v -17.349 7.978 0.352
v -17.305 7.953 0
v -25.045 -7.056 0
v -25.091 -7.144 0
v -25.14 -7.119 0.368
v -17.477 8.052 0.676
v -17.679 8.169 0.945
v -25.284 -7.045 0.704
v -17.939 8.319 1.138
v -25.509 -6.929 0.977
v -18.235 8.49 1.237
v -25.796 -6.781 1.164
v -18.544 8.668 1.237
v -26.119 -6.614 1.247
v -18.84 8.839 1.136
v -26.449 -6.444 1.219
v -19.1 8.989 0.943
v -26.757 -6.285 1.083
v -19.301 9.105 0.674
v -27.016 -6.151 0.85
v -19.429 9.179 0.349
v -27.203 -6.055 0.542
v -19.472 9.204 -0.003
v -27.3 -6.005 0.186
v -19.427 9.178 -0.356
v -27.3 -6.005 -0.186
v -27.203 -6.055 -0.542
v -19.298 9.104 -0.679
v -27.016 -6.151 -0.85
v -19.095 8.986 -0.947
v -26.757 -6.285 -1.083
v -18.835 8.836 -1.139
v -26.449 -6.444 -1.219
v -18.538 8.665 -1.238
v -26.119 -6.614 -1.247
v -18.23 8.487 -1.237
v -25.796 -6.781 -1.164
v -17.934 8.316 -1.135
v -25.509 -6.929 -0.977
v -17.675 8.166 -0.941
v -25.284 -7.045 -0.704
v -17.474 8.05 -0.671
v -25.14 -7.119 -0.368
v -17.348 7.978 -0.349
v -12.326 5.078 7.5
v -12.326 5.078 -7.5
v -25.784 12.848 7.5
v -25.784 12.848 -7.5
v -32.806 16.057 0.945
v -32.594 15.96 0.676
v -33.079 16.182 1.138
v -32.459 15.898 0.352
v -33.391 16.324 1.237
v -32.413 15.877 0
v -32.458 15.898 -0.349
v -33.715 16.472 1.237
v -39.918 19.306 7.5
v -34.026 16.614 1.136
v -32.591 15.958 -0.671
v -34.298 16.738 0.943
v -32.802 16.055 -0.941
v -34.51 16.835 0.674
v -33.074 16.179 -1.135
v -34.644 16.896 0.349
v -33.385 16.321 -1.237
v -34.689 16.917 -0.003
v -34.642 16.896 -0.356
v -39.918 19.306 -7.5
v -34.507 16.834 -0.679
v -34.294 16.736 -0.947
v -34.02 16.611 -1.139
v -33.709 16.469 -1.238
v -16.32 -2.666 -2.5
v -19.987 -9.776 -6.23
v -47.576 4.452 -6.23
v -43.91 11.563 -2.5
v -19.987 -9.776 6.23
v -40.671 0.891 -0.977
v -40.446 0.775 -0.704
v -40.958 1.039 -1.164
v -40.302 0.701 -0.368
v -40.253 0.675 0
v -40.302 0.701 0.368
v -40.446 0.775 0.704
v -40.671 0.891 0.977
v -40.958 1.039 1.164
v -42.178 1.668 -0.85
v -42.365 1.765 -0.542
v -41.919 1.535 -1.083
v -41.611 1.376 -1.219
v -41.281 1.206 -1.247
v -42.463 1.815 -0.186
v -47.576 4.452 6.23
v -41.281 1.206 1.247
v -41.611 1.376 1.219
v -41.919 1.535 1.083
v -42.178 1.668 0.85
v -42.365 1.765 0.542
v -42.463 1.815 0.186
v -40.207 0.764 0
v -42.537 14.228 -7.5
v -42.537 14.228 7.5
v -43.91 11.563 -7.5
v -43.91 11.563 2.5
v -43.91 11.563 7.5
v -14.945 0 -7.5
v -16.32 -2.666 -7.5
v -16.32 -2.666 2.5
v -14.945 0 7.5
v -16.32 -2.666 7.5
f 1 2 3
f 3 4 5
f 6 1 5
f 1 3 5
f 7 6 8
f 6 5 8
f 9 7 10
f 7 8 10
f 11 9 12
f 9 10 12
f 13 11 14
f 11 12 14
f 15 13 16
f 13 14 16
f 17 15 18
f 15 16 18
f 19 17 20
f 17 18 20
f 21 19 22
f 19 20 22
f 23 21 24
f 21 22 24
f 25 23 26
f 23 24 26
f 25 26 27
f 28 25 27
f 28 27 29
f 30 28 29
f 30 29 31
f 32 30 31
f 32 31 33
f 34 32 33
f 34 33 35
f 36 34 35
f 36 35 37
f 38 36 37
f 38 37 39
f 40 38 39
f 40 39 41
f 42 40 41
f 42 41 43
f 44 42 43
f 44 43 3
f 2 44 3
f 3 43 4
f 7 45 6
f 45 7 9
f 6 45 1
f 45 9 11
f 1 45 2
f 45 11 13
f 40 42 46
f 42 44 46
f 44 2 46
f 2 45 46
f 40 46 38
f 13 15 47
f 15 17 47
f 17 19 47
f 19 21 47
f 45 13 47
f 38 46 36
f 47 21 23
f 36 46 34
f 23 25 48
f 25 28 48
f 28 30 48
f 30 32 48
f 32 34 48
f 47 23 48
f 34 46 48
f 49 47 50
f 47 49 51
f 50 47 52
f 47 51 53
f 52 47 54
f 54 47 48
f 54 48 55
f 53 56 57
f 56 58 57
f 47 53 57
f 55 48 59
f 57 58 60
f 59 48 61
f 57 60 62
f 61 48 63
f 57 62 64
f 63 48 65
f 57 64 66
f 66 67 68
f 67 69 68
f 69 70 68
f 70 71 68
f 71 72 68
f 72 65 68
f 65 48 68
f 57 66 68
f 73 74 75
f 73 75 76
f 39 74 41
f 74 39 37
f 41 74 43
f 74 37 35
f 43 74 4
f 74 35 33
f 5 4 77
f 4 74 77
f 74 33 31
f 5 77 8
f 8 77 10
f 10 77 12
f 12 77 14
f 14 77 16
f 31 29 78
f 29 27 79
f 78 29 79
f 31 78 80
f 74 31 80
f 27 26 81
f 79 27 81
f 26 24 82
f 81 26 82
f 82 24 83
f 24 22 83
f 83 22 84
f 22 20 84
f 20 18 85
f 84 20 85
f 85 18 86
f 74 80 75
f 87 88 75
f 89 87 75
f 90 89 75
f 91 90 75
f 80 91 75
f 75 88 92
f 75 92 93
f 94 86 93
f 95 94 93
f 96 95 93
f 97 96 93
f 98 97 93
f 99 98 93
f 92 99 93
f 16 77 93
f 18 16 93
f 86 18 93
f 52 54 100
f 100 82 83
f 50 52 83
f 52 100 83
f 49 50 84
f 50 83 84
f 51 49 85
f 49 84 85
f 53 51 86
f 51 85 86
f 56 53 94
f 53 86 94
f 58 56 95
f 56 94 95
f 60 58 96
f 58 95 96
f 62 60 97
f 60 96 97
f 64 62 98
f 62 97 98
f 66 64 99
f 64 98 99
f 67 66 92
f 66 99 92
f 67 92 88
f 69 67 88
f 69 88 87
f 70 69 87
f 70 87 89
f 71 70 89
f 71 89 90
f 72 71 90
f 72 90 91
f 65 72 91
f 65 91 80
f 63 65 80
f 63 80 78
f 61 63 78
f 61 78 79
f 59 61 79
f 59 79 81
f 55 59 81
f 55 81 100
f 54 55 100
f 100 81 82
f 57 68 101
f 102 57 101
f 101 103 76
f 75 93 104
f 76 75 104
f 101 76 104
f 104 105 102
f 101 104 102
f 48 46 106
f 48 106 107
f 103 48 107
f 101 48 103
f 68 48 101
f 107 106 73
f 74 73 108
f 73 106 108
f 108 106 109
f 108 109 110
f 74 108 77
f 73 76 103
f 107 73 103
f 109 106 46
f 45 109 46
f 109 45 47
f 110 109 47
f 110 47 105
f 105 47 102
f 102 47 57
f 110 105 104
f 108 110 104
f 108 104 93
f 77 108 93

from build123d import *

# Parameters (mm, degrees)
STOCK_SPIRALE_ENROUL_E_1_START = -7.5
STOCK_SPIRALE_ENROUL_E_1_DEPTH = 15
BOSS_EXTRU_1_DEPTH             = 15
ENL_V_MAT_EXTRU_1_REACH        = 41.844
ESQUISSE40_R                   = 1.25
ENL_V_MAT_EXTRU_39_DEPTH       = 0.1
ESQUISSE45_R                   = 1.25
ENL_V_MAT_EXTRU_44_DEPTH       = 54.34000069


# Read off the part's stored shape, not the designer's step: Stock-spirale_enroulée-1
with BuildPart() as part:
    # Stock-spirale_enroulée-1 outline → Stock-spirale_enroulée-1 (new body)
    with BuildSketch(Plane.XY.offset(STOCK_SPIRALE_ENROUL_E_1_START)):
        Polygon((-32.409116649, 0), (-14.945224597, 0), (-12.326158681, 5.078291377), (-25.783924084, 12.848135855), (-39.918116919, 19.306194835), (-42.53651187, 14.227557472), align=None)
    extrude(amount=STOCK_SPIRALE_ENROUL_E_1_DEPTH)

    # Esquisse1 → Boss.-Extru.1 (add)
    with BuildSketch(Plane.XY.offset(7.5)):
        Polygon((-42.53651187, 14.227557472), (-32.409116649, 0), (-14.945224597, 0), (-19.987274825, -9.776386321), (-47.576330697, 4.452327735), align=None)
    extrude(amount=-BOSS_EXTRU_1_DEPTH)

    # Enlèv. mat.-Extru.1: up to this plane
    enl_v_mat_extru_1_end = Plane(origin=(-39.918116919, 19.306194835, 7.5), z_dir=(0.8888229444852807, -0.45825077562020095, 0))
    # Esquisse2 → Enlèv. mat.-Extru.1 (cut, up to the surface)
    with BuildSketch(Plane(origin=(-11.805211849, 6.088391881, 0), x_dir=(0, 0, -1), z_dir=(0.8887623928011207, -0.4583682025865522, 0)), mode=Mode.PRIVATE) as enl_v_mat_extru_1_sk1:
        Polygon((-7.5, -9.850415736), (-2.5, -9.850415736), (-6.230461265, -17.850415736), (-7.5, -17.850415736), align=None)
    enl_v_mat_extru_1_tool1 = split(extrude(enl_v_mat_extru_1_sk1.sketch, amount=-ENL_V_MAT_EXTRU_1_REACH, mode=Mode.PRIVATE), bisect_by=enl_v_mat_extru_1_end, keep=Keep.BOTH, mode=Mode.PRIVATE)
    add(enl_v_mat_extru_1_tool1.solids().sort_by_distance((-17.790155, -5.516236, 5.747642))[0], mode=Mode.SUBTRACT)
    # Esquisse2 → Enlèv. mat.-Extru.1 (cut, up to the surface)
    with BuildSketch(Plane(origin=(-11.805211849, 6.088391881, 0), x_dir=(0, 0, -1), z_dir=(0.8887623928011207, -0.4583682025865522, 0)), mode=Mode.PRIVATE) as enl_v_mat_extru_1_sk2:
        Polygon((6.230461265, -17.850415736), (2.5, -9.850415736), (7.5, -9.850415736), (7.5, -17.850415736), align=None)
    enl_v_mat_extru_1_tool2 = split(extrude(enl_v_mat_extru_1_sk2.sketch, amount=-ENL_V_MAT_EXTRU_1_REACH, mode=Mode.PRIVATE), bisect_by=enl_v_mat_extru_1_end, keep=Keep.BOTH, mode=Mode.PRIVATE)
    add(enl_v_mat_extru_1_tool2.solids().sort_by_distance((-17.790155, -5.516236, -5.747642))[0], mode=Mode.SUBTRACT)

    # Esquisse40 → Enlèv. mat.-Extru.39 (cut)
    with BuildSketch(Plane(origin=(-35.583416905, -1.7328691, -7.5), x_dir=(0.8887623928011112, -0.4583682025865705, 0), z_dir=(-0.4583682025865705, -0.8887623928011112, 0))):
        with Locations((-6.504075816, 7.5)):
            Circle(ESQUISSE40_R)
        with Locations((10.556032704, 7.5)):
            Circle(ESQUISSE40_R)
    extrude(amount=-ENL_V_MAT_EXTRU_39_DEPTH, mode=Mode.SUBTRACT)

    # Esquisse45 → Enlèv. mat.-Extru.44 (cut, through all)
    with BuildSketch(Plane(origin=(-8.182062976, -15.864778202, 0), x_dir=(0.8887623928011112, -0.4583682025865705, 0), z_dir=(-0.4583682025865705, -0.8887623928011112, 0))):
        with Locations((-37.334986474, 0)):
            Circle(ESQUISSE45_R)
        with Locations((-20.274877954, 0)):
            Circle(ESQUISSE45_R)
    extrude(amount=-ENL_V_MAT_EXTRU_44_DEPTH, mode=Mode.SUBTRACT)


solid = part.part
